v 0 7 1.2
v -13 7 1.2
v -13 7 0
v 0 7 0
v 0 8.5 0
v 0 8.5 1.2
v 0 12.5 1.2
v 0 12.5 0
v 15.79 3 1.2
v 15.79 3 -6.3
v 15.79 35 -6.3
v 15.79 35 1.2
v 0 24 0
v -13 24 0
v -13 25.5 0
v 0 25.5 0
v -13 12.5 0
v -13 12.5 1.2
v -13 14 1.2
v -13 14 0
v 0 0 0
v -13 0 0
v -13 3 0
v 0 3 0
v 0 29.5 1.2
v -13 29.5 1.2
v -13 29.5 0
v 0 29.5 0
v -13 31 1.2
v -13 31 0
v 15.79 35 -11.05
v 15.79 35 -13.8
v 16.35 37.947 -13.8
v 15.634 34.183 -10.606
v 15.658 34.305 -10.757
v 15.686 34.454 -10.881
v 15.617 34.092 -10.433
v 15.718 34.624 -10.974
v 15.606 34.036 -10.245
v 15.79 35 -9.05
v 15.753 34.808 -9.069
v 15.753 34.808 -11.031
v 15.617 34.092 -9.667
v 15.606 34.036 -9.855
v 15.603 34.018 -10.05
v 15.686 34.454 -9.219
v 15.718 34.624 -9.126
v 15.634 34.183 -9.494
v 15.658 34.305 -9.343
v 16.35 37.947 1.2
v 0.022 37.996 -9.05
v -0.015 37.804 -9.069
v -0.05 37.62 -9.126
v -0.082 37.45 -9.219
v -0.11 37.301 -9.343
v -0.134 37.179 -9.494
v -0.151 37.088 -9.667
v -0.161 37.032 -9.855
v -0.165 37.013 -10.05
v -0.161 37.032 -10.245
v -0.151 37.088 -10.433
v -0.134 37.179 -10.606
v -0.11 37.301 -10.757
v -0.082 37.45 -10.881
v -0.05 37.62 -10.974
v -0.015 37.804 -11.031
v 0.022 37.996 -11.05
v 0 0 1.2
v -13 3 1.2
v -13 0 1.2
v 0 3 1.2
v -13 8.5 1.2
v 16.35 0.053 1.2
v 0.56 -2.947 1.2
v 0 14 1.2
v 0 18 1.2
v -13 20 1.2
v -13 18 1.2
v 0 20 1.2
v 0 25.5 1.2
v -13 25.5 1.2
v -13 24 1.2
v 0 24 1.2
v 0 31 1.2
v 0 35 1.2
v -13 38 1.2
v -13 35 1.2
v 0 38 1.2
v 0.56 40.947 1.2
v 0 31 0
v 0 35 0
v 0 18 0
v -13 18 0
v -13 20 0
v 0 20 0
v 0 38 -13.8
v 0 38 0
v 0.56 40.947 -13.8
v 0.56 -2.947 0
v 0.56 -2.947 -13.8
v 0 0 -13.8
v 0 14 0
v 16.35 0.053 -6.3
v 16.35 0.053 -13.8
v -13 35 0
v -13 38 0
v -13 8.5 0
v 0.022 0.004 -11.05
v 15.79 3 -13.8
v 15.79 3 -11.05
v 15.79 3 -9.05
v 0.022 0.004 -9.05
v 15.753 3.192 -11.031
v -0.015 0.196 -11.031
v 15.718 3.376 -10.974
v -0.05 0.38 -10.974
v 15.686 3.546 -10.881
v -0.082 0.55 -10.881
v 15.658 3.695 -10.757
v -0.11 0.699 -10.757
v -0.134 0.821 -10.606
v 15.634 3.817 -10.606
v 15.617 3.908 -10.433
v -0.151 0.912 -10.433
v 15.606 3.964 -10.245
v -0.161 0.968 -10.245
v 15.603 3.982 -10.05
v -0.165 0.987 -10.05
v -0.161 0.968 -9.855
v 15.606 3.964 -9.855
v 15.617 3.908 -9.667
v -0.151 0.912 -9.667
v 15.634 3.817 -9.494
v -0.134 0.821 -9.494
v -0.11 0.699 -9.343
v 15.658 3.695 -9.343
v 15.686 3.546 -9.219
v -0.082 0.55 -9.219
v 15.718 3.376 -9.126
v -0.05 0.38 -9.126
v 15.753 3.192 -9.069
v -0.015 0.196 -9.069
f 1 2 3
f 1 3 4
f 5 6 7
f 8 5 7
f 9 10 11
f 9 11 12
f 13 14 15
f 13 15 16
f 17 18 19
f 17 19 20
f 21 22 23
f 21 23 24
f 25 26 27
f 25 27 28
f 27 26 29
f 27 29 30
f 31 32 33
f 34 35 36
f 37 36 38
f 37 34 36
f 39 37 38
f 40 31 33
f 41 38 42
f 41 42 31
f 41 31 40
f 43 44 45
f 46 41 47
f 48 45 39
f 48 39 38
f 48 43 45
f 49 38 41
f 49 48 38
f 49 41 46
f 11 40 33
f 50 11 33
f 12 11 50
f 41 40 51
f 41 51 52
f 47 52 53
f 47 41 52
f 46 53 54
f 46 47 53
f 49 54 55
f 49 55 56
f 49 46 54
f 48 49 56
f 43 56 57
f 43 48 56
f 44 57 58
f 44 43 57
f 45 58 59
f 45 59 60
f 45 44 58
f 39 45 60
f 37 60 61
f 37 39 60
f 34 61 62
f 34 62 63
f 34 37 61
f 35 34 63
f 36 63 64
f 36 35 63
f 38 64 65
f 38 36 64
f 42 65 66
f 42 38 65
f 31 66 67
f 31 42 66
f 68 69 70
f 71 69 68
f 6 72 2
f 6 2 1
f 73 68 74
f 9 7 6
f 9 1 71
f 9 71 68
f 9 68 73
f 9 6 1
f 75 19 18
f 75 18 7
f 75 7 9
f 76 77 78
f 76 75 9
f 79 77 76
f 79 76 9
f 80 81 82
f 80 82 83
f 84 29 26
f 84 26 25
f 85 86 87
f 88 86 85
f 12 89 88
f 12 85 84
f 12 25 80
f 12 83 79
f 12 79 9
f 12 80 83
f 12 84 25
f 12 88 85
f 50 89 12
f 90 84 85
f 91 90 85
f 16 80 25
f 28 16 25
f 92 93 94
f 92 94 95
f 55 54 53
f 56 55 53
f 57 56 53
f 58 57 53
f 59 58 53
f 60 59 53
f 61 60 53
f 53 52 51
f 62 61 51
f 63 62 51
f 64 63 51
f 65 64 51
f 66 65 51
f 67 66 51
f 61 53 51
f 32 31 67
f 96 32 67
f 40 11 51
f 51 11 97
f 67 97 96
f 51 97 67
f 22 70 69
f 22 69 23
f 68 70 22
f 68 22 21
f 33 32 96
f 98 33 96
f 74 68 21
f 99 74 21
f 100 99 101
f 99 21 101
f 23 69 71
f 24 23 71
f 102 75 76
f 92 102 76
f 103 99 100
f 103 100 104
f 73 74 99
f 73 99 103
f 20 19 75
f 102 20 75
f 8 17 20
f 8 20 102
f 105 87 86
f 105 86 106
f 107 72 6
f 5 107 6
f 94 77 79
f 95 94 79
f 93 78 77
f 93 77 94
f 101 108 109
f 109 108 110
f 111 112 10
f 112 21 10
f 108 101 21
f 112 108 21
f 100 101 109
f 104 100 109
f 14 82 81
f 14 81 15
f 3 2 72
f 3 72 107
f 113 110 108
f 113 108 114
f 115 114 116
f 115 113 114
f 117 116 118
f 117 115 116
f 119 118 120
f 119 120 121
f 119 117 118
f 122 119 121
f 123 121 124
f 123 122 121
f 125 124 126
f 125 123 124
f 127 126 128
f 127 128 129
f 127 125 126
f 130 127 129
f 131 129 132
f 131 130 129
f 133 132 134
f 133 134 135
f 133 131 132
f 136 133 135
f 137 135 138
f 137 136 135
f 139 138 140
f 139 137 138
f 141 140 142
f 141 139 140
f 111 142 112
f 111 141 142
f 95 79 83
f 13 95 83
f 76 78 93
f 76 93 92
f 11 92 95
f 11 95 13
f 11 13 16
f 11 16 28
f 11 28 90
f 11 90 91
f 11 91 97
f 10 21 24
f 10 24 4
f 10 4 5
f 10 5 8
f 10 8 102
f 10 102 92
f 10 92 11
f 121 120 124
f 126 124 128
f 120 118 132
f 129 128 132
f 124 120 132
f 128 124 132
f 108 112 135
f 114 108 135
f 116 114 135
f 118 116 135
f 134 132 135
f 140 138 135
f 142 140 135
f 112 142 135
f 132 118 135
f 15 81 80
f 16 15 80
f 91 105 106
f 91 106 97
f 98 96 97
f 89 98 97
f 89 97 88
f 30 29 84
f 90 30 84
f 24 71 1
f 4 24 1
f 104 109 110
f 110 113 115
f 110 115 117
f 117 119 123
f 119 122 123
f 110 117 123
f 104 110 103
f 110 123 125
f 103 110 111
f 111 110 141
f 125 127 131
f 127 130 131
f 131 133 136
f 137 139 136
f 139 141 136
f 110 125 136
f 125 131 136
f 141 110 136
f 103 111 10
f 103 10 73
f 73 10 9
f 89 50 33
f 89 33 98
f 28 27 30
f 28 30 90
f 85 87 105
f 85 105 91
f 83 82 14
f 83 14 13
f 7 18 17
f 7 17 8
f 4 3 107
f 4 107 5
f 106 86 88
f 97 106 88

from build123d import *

# Parameters (mm, degrees)
F1_DEPTH  = 38
F2_W      = 13
F2_H      = 4
F3_DEPTH  = 7.501
F4_W      = 16.0720253857
F4_H      = 15
F5_DEPTH  = 3
F6_W      = 16.0720253857
F6_H      = 15
F7_DEPTH  = 3
F9_DEPTH  = 16.05
F11_DEPTH = 16.05


with BuildPart() as f1:
    # F0 (on Front) → F1 (new body)
    with BuildSketch(Plane.XZ):
        Polygon((-13, 1.2), (-13, 0), (0, 0), (15.7895535086, -6.3), (15.7895535086, 1.2), align=None)
    extrude(amount=-F1_DEPTH)

    # F2 (on face) → F3 (cut, through all)
    with BuildSketch(Plane.XY.offset(1.2)):
        with Locations((-6.5, 33)):
            Rectangle(F2_W, F2_H)
        with Locations((-6.5, 27.5)):
            Rectangle(F2_W, F2_H)
        with Locations((-6.5, 22)):
            Rectangle(F2_W, F2_H)
        with Locations((-6.5, 16)):
            Rectangle(F2_W, F2_H)
        with Locations((-6.5, 10.5)):
            Rectangle(F2_W, F2_H)
        with Locations((-6.5, 5)):
            Rectangle(F2_W, F2_H)
        Polygon((15.7895535086, 3), (0, 0), (15.7895535086, 0), align=None)
        Polygon((15.7895535086, 38), (0, 38), (15.7895535086, 35), align=None)
    extrude(amount=-F3_DEPTH, mode=Mode.SUBTRACT)

    # F4 (on face) → F5 (join)
    with BuildSketch(Plane(origin=(6.9684065657, 36.676009446, 0), x_dir=(-0.9824246248, 0.186659735, 0), z_dir=(0.186659735, 0.9824246248, 0))):
        with Locations((-0.9429427615, -6.3)):
            Rectangle(F4_W, F4_H)
    extrude(amount=F5_DEPTH)

    # F6 (on face) → F7 (join)
    with BuildSketch(Plane(origin=(0, 0, 0), x_dir=(0.9824246248, 0.186659735, 0), z_dir=(0.186659735, -0.9824246248, 0))):
        Polygon((16.0720253857, -6.3), (0, 0), (0, -13.8), (16.0720253857, -13.8), align=None)
        with Locations((8.0360126929, -6.3)):
            Rectangle(F6_W, F6_H)
    extrude(amount=F7_DEPTH)

    # F8 (on face) → F9 (join)
    with BuildSketch(Plane(origin=(8.8211469429, -1.676009446, 0), x_dir=(0.186659735, 0.9824246248, 0), z_dir=(0.9824246248, -0.186659735, 0))):
        with BuildLine():
            Line((37.3321357405, -11.05), (37.3321357405, -9.05))
            ThreePointArc((37.3321357405, -9.05), (36.3321357405, -10.05), (37.3321357405, -11.05))
        make_face()
    extrude(amount=-F9_DEPTH)

    # F10 (on face) → F11 (join)
    with BuildSketch(Plane(origin=(15.7895535086, 3, 0), x_dir=(-0.186659735, 0.9824246248, 0), z_dir=(0.9824246248, 0.186659735, 0))):
        with BuildLine():
            Line((0, -9.05), (0, -11.05))
            ThreePointArc((0, -11.05), (1, -10.05), (0, -9.05))
        make_face()
    extrude(amount=-F11_DEPTH)


solid = f1.part
